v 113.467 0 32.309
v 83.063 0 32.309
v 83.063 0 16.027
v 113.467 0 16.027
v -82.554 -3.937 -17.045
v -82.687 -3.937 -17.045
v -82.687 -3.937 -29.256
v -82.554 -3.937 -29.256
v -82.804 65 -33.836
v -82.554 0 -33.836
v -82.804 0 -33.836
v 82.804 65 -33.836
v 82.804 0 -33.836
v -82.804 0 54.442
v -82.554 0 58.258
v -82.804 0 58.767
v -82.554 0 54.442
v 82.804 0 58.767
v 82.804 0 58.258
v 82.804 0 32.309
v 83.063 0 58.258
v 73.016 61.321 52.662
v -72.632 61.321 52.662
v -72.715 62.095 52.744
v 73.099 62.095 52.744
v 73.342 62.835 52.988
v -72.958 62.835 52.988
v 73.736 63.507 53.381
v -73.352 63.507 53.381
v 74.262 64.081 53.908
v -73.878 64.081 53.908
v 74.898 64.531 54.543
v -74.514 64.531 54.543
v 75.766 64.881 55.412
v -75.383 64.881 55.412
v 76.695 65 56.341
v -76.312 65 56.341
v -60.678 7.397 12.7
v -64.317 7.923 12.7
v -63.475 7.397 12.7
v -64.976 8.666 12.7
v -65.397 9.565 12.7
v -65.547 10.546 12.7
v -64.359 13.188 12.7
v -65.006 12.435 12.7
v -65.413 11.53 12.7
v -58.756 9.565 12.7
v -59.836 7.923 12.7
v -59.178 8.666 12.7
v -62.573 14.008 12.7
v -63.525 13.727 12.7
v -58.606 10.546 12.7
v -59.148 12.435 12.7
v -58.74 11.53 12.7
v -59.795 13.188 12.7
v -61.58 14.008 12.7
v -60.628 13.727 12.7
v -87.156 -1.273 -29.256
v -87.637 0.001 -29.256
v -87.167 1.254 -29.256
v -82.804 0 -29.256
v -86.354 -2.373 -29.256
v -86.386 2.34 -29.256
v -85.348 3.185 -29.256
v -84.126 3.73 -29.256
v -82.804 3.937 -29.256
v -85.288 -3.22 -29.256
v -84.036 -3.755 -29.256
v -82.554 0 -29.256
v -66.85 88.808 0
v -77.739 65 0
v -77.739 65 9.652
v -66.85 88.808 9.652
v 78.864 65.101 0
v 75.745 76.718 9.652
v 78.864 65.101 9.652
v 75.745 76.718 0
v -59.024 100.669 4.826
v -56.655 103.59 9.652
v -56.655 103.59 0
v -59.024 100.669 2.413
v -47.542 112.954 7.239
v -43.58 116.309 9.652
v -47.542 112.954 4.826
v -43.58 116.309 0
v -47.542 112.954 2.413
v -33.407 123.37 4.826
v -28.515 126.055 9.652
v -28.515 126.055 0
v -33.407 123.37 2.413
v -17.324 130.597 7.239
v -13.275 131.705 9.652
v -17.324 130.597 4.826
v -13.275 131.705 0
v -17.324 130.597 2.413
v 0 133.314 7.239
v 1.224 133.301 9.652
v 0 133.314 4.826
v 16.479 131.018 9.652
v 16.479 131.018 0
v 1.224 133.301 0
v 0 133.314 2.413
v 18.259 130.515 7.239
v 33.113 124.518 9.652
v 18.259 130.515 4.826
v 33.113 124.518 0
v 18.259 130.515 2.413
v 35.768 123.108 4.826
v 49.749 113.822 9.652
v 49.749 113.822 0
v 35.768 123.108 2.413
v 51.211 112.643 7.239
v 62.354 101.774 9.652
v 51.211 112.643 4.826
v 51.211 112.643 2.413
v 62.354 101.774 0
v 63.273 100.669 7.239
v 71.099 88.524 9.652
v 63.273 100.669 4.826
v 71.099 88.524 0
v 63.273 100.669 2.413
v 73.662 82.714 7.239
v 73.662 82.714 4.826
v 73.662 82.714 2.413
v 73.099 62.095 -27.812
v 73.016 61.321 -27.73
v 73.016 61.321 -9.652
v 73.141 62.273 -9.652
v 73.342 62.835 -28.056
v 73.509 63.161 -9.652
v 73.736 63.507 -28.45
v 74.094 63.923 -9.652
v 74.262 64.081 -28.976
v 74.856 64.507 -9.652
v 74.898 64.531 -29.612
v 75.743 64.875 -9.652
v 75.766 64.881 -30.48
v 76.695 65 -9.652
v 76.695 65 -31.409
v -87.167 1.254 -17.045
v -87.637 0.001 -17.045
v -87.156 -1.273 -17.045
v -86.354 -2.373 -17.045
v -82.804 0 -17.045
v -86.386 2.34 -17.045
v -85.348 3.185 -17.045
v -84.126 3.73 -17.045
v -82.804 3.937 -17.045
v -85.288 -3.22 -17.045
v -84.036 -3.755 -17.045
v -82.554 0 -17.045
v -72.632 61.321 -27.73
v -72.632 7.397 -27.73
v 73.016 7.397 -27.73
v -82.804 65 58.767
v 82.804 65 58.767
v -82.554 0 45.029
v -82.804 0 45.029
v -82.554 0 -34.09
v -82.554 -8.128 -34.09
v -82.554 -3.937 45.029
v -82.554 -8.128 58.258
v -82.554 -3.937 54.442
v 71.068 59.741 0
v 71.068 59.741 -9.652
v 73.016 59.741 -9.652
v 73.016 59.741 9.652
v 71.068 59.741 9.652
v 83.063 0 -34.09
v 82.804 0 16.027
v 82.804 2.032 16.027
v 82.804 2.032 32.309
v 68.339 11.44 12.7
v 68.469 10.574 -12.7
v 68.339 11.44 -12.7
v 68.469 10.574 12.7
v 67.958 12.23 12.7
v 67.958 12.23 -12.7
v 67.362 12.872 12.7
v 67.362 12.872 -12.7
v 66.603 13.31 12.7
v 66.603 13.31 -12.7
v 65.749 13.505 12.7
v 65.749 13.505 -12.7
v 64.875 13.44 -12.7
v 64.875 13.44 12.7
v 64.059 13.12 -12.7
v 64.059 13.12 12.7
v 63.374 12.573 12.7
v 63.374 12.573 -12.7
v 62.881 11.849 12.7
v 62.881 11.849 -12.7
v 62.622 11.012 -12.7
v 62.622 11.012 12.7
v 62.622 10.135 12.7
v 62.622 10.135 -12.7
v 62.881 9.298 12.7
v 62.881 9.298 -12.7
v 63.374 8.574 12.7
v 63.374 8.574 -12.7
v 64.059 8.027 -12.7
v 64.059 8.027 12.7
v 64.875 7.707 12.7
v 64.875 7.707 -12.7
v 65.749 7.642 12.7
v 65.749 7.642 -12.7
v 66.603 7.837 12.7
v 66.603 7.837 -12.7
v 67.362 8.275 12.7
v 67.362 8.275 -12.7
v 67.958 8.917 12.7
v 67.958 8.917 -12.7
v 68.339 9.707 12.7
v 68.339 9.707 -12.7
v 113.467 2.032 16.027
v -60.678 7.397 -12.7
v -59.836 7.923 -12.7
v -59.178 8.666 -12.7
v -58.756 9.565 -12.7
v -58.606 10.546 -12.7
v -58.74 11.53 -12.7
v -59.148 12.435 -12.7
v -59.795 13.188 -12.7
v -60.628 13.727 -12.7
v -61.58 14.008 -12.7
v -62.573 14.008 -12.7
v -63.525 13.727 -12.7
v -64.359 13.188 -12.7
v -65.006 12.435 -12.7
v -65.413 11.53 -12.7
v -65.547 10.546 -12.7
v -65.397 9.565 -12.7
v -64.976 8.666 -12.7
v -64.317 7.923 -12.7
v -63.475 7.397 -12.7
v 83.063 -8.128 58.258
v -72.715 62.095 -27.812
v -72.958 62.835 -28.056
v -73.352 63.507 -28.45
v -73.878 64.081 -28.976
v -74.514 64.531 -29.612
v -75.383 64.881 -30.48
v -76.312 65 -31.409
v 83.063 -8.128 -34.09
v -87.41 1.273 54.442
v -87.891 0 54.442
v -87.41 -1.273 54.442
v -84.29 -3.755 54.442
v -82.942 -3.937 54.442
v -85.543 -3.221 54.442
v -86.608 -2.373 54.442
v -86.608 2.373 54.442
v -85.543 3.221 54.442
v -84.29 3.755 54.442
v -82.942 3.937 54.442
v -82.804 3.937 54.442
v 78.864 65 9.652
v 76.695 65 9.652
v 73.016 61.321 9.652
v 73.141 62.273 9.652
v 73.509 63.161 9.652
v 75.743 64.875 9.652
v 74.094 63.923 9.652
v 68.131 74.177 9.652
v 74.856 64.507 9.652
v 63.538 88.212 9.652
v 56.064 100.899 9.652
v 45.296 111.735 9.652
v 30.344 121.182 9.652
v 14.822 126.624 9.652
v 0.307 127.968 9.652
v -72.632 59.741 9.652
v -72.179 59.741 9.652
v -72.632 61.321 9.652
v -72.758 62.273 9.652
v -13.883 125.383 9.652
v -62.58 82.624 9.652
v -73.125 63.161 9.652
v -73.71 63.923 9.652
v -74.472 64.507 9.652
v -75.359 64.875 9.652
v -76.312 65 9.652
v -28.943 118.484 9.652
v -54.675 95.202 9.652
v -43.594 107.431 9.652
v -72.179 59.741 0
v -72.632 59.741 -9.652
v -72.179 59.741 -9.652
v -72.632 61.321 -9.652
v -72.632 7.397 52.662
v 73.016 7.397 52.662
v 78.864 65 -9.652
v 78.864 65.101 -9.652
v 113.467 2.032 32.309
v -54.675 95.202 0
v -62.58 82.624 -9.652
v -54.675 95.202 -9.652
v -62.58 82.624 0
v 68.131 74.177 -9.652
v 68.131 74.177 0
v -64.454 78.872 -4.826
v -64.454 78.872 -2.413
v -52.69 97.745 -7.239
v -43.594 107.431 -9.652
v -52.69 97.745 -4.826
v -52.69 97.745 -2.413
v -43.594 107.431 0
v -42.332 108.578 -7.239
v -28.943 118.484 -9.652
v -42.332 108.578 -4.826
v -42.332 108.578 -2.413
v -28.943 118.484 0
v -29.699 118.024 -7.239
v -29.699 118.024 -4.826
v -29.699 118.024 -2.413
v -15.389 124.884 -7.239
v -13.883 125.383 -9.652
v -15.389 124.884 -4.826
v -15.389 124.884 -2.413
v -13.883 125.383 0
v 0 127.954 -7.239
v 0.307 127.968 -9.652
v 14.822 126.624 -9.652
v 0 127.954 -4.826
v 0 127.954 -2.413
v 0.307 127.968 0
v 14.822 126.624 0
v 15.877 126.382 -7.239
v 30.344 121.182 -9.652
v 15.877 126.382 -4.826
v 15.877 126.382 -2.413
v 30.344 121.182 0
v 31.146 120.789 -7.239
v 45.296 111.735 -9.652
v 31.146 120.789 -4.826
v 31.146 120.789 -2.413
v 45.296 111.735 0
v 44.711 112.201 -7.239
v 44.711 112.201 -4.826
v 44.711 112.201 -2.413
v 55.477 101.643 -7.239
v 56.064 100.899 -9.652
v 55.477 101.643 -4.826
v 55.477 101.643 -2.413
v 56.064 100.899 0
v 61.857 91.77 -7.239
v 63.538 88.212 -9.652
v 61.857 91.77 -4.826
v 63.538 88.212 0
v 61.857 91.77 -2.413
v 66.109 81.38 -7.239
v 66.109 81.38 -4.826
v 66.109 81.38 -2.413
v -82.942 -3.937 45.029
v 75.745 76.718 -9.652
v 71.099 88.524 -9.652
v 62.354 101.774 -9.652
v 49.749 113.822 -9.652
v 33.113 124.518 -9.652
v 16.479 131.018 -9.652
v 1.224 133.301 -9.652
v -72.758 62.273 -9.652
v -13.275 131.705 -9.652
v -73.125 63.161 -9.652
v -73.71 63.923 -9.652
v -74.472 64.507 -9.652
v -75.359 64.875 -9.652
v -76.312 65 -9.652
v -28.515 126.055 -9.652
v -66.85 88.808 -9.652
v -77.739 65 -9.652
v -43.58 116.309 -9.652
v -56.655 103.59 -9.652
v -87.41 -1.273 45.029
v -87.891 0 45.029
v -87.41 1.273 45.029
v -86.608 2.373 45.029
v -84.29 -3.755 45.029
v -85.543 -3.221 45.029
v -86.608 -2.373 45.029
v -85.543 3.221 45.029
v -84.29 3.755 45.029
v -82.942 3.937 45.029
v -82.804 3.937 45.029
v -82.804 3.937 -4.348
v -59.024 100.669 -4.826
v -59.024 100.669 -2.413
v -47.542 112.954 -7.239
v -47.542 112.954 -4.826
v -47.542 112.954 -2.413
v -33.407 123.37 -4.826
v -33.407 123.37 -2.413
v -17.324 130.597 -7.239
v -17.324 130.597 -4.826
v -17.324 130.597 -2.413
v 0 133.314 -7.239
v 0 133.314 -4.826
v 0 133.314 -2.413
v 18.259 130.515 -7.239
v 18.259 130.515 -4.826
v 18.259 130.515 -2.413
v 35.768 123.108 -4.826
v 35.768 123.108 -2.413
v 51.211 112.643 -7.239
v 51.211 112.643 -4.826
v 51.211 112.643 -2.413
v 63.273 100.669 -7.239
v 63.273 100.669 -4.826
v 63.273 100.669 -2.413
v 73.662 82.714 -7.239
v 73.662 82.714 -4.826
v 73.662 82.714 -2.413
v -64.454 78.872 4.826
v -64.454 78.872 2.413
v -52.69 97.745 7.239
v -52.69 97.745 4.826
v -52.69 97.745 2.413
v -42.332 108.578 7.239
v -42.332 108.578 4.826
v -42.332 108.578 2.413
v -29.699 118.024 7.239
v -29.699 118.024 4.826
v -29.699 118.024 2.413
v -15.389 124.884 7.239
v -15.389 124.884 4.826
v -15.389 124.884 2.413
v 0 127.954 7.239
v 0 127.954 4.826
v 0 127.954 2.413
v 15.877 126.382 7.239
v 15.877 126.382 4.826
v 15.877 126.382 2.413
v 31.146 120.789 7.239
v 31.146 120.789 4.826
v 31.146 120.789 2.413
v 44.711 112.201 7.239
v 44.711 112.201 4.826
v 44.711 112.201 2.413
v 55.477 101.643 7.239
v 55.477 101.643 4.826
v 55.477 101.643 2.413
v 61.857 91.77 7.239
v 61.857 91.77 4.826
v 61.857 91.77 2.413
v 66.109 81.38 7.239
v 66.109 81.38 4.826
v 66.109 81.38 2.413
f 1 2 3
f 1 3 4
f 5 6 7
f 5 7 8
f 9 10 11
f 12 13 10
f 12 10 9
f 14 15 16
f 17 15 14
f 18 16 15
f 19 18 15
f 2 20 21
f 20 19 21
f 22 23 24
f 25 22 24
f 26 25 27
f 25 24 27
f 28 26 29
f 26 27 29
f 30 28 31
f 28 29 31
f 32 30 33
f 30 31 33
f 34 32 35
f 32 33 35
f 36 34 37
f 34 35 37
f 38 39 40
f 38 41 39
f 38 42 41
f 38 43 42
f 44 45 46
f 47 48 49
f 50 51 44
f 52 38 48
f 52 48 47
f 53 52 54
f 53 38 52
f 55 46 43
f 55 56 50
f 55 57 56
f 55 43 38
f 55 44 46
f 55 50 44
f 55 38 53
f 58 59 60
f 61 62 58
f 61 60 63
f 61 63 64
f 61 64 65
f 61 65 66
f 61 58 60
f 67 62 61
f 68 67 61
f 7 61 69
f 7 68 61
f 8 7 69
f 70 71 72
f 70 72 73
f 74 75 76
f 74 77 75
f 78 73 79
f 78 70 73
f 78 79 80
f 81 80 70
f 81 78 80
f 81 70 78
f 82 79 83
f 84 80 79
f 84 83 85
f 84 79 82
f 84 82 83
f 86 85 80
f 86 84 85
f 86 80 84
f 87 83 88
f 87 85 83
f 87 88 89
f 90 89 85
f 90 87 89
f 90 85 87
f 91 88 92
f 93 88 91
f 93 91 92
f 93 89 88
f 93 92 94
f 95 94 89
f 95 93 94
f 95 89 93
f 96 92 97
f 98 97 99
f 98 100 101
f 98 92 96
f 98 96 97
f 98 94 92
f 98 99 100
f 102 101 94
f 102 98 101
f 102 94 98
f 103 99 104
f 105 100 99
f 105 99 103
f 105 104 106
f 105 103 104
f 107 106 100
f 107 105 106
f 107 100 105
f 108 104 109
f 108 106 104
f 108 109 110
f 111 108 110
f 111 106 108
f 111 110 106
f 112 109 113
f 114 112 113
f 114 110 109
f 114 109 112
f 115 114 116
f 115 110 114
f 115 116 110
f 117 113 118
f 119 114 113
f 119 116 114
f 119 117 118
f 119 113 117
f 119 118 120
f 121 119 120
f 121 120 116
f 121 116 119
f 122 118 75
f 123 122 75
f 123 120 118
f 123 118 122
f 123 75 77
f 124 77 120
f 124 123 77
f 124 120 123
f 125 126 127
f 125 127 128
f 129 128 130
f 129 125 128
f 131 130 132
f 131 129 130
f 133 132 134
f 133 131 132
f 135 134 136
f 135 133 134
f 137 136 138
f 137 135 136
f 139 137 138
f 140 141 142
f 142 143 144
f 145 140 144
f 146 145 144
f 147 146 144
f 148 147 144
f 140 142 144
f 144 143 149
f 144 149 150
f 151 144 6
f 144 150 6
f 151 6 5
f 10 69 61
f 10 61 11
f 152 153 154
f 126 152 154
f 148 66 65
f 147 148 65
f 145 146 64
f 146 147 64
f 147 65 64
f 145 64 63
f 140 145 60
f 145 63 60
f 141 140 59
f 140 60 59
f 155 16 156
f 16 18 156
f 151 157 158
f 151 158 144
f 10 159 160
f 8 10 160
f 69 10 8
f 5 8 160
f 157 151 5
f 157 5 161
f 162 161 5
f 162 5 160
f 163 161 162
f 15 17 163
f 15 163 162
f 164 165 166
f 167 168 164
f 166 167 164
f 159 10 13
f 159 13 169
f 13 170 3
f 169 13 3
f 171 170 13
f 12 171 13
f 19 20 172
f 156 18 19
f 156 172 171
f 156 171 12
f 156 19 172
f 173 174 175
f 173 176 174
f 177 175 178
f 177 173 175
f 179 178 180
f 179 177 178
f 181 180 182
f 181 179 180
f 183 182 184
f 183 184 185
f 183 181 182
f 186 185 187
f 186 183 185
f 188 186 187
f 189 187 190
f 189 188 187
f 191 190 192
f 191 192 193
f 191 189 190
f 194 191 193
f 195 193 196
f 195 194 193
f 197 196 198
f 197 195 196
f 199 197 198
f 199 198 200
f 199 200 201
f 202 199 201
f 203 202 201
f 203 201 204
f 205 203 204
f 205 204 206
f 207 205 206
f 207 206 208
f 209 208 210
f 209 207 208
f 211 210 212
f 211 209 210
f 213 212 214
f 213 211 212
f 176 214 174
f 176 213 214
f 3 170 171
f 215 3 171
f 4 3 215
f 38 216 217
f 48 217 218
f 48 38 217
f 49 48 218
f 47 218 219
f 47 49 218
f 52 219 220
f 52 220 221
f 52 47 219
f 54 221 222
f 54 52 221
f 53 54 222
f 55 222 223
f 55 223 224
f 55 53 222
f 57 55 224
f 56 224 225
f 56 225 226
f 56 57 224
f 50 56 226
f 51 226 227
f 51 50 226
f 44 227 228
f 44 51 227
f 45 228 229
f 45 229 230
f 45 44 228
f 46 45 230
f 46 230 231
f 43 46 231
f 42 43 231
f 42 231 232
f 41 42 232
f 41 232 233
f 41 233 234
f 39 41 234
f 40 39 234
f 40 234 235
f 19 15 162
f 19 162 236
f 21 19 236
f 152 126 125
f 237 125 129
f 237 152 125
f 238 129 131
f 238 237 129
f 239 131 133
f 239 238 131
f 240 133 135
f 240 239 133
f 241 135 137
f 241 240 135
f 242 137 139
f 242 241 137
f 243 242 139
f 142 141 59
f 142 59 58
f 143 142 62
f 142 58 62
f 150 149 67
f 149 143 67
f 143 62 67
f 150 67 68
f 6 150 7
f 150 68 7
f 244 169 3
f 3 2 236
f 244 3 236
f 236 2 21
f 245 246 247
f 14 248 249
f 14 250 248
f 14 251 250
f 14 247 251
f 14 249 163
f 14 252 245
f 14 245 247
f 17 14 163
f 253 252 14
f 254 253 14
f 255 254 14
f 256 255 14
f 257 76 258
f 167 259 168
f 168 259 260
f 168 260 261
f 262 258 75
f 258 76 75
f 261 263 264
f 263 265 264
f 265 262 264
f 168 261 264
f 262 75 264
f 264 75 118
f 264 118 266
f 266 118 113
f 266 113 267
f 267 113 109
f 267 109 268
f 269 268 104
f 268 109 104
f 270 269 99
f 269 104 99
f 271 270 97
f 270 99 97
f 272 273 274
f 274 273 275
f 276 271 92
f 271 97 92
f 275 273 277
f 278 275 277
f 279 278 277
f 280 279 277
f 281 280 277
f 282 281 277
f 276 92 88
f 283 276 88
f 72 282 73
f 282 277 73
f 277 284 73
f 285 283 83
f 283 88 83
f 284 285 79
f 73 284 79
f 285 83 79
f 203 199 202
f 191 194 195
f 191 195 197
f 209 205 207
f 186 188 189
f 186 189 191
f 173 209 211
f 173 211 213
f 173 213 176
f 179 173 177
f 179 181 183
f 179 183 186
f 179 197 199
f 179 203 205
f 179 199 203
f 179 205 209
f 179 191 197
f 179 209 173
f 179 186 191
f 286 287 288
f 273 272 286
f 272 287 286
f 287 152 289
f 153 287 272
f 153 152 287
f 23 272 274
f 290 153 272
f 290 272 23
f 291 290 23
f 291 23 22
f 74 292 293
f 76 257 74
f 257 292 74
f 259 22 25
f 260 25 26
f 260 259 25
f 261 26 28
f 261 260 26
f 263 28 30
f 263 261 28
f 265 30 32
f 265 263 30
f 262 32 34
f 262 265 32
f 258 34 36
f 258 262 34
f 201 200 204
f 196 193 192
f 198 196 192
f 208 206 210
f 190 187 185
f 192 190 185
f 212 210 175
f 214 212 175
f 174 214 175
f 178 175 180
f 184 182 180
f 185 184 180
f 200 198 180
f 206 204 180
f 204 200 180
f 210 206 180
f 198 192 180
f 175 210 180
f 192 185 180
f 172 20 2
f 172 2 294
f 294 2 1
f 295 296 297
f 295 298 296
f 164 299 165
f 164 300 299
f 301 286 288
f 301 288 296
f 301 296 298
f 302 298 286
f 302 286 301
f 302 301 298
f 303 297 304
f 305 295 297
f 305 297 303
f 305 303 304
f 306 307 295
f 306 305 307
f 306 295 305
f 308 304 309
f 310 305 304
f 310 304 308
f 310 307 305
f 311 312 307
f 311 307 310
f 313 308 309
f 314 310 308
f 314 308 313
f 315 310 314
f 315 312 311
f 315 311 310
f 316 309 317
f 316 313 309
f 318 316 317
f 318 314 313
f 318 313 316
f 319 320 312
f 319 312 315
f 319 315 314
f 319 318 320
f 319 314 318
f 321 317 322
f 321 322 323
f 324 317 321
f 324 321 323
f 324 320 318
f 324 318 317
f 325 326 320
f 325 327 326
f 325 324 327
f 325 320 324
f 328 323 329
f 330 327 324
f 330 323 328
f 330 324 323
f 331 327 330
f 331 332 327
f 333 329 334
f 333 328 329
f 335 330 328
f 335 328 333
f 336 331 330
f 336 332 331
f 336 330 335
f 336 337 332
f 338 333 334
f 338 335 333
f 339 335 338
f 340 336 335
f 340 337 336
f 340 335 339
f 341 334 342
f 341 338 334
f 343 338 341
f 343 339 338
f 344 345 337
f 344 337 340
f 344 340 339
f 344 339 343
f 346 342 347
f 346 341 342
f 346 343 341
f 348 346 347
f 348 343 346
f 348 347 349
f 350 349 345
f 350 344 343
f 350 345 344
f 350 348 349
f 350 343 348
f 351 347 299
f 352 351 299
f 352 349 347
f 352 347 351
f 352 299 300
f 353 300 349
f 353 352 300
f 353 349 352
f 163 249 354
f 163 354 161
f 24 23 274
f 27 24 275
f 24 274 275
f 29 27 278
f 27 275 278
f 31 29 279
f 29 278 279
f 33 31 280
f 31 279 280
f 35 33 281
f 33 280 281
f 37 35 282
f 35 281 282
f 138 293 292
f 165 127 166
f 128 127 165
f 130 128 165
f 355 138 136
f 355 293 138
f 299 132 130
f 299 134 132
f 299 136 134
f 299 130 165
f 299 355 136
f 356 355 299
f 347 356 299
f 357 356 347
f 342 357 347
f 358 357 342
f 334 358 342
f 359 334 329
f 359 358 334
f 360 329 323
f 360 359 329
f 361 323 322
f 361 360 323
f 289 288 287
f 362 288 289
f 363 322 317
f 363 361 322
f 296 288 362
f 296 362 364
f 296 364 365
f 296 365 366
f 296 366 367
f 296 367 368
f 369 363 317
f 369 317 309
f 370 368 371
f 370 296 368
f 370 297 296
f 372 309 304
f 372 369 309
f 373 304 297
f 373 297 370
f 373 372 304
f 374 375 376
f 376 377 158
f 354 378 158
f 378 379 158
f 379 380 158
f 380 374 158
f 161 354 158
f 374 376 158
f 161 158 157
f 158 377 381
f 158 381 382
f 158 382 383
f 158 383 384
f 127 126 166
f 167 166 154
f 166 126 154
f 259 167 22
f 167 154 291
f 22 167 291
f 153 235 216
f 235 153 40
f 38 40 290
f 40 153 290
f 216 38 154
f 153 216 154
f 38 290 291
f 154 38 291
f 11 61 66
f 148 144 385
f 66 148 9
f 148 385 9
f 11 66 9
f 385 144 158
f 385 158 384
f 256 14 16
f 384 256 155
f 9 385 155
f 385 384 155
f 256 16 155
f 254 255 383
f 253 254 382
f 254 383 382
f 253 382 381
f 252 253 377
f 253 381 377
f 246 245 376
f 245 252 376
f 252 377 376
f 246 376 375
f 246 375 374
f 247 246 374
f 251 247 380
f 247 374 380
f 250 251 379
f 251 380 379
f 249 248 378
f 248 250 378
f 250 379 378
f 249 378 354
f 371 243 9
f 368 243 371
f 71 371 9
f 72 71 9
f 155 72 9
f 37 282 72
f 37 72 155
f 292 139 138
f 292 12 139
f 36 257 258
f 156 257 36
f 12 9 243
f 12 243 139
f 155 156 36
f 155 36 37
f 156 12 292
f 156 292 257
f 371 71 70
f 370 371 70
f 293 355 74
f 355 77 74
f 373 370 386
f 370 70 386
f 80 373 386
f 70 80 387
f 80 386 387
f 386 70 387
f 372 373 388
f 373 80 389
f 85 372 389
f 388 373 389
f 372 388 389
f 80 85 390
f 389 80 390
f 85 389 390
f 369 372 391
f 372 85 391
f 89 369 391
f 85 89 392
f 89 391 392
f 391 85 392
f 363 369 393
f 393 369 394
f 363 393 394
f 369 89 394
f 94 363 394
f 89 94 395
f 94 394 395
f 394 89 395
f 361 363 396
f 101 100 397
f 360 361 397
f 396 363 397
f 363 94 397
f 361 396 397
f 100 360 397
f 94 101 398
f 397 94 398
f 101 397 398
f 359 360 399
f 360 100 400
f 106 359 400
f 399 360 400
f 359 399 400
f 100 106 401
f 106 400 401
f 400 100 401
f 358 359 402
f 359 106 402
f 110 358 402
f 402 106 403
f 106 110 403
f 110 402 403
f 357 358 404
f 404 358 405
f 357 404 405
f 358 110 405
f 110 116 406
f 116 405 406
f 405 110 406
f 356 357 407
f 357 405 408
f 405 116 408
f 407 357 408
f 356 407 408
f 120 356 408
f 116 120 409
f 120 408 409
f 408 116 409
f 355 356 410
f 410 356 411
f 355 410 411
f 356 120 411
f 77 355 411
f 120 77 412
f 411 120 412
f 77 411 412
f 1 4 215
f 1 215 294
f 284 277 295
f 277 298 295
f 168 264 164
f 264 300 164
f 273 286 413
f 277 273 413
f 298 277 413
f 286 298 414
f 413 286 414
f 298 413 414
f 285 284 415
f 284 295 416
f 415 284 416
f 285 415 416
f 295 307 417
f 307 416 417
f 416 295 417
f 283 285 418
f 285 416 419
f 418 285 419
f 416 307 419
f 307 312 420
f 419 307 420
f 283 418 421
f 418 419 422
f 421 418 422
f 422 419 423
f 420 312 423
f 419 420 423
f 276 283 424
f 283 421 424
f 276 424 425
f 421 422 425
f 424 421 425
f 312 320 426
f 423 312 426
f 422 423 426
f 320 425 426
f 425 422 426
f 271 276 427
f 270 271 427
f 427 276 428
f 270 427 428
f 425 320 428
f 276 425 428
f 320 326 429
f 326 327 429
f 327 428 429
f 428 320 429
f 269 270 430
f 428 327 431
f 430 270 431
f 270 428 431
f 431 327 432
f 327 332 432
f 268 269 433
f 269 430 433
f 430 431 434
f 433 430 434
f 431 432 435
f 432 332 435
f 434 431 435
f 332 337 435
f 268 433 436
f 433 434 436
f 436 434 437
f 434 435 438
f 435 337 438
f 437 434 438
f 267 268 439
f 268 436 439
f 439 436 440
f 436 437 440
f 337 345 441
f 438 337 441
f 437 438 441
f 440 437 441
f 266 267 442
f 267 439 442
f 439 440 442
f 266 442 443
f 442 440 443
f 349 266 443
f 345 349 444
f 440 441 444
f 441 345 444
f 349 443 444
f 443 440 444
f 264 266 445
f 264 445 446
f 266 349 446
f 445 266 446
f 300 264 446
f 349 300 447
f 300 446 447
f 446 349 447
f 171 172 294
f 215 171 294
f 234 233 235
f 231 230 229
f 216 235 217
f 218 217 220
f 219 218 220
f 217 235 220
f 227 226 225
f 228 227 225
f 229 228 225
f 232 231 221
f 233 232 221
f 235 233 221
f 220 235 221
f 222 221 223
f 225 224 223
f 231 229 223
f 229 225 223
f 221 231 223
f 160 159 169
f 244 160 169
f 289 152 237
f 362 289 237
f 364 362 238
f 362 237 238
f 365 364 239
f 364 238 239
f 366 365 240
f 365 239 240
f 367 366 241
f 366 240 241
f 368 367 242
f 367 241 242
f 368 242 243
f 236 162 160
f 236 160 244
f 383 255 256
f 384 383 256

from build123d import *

# Parameters (mm, degrees)
F0_W         = 165.6168848276
F0_H         = 92.3485867679
F1_DEPTH     = 8.128
F2_W         = 65.0001764297
F2_H         = 58.7672814727
F2_H_2       = 33.835709095
F3_DEPTH     = 82.804
F4_W         = 145.6484049559
F4_H         = 80.3916100413
F5_DEPTH     = 126.492
F7_DEPTH     = 9.652
F10_DEPTH    = 7.3972418904
F11_R        = 3.6792614691
F12_W        = 10.9393596649
F12_H        = 9.4129405916
F12_W_2      = 8.9041367173
F12_H_2      = 12.2113823891
F13_DEPTH    = 3.937
F14_T1_DEPTH = 34.8129405916
F14_T3_DEPTH = 37.6046565067
F14_T5_DEPTH = 37.6113823891
F17_R        = 3.4704088756
F18_DEPTH    = 12.7
F17_R_2      = 2.9399233627
F19_W        = 34.344509244
F19_H        = 16.2818413228
F20_DEPTH    = 2.032


# Not quite as in the source:
# - a fillet or chamfer that OpenCascade refuses, or shapes differently, is made with other operations: its cross-section is extruded or revolved along the edge and cut away or added
# - the program builds the solid bodies; features that only make, move or delete a surface that nothing else refers to are left out


with BuildPart() as f1:
    # F0 (on Front) → F1 (new body)
    with BuildSketch(Plane.XZ):
        with Locations((0.2544000745, 12.0841804892)):
            Rectangle(F0_W, F0_H)
    extrude(amount=F1_DEPTH)

    # F2 (on Right) → F3 (join, symmetric)
    with BuildSketch(Plane.YZ):
        with Locations((32.5000882149, 29.3836407363)):
            Rectangle(F2_W, F2_H)
        with Locations((32.5000882149, -16.9178545475)):
            Rectangle(F2_W, F2_H_2)
    extrude(amount=F3_DEPTH, both=True)

    # F4 (on Front) → F5 (cut)
    with BuildSketch(Plane.XZ):
        with Locations((0.191912055, 12.4657889828)):
            Rectangle(F4_W, F4_H)
    extrude(amount=-F5_DEPTH, mode=Mode.SUBTRACT)

    # F6 (on Top) → F7 (join, symmetric)
    with BuildSketch(Plane.XY):
        with BuildLine():
            add(Edge.make_bspline(
                [(-79.9747332931, 59.7409568727), (-74.759309212, 71.5402326481), (-64.1121283898, 104.8437669446), (-0.8218087411, 149.2928303601), (69.0623713402, 104.8495046273), (76.000106137, 76.6716472512), (78.8641497493, 65.1005506516)],
                knots=[0, 0, 0, 0, 0.2285913714, 0.5054588291, 0.7899145134, 1, 1, 1, 1], degree=3))
            Line((-79.9747332931, 59.7409568727), (-72.1789598465, 59.7409568727))
            add(Edge.make_bspline(
                [(-72.1789598465, 59.7409568727), (-67.4777405263, 72.5239789548), (-57.1703831688, 100.5505754042), (-1.1788929882, 141.3410376084), (62.5812635029, 105.9839202997), (68.3926515764, 74.3199638324), (71.0683837533, 59.7409568727)],
                knots=[0, 0, 0, 0, 0.226520536, 0.4966430951, 0.7682398336, 1, 1, 1, 1], degree=3))
            Line((71.0683837533, 59.7409568727), (78.8641497493, 59.7409568727))
            Line((78.8641497493, 59.7409568727), (78.8641497493, 65.1005506516))
        make_face()
    extrude(amount=F7_DEPTH, both=True)

    # F10 (add): a face of the model
    f10_faces = [f1.faces().sort_by_distance(p)[0] for p in [
        (0.191912055, 0, 12.4657889828),
    ]]
    extrude(f10_faces, amount=F10_DEPTH)

    # F11
    f11_edges = [f1.edges().sort_by_distance(p)[0] for p in [
        (0.191912, 65.000176, -27.730016),
        (0.191912, 65.000176, 52.661594),
        (-72.63229, 65.000176, 31.156797),
        (73.016115, 65.000176, 31.156797),
        (73.016115, 65.000176, -18.691008),
        (-72.63229, 65.000176, -18.691008),
    ]]
    fillet(f11_edges, radius=F11_R)

    # F12 (on Front) → F13 (join, symmetric)
    with BuildSketch(Plane.XZ):
        with Locations((-82.5518220663, 49.7359465808)):
            Rectangle(F12_W, F12_H)
        with Locations((-83.3150334656, -23.1507476419)):
            Rectangle(F12_W_2, F12_H_2)
    extrude(amount=F13_DEPTH, both=True)

    # F14: fillet of radius 5.08 on 4 edges, made by hand

    # F14_s2 → F14_t1 (cut)
    with BuildSketch(Plane.XY.offset(32.329476285)):
        with BuildLine():
            ThreePointArc((-82.9415018988, 3.937), (-86.5336043472, 2.4491024484), (-88.0215018988, -1.143))
            Line((-88.0215018988, -1.143), (-88.0215018988, 3.937))
            Line((-88.0215018988, 3.937), (-82.9415018988, 3.937))
        make_face()
        with BuildLine():
            ThreePointArc((-88.0215018988, 1.143), (-86.5336043472, -2.4491024484), (-82.9415018988, -3.937))
            Line((-82.9415018988, -3.937), (-88.0215018988, -3.937))
            Line((-88.0215018988, -3.937), (-88.0215018988, 1.143))
        make_face()
    extrude(amount=F14_T1_DEPTH, mode=Mode.SUBTRACT)

    # F14_s4 → F14_t3 (cut)
    with BuildSketch(Plane.XY.offset(-41.9530758953)):
        with BuildLine():
            ThreePointArc((-82.804, 3.937), (-86.3202989517, 2.4088773385), (-87.7671018243, -1.1416548235))
            Line((-87.7671018243, -1.1416548235), (-87.7671018243, 3.937))
            Line((-87.7671018243, 3.937), (-82.804, 3.937))
        make_face()
    extrude(amount=F14_T3_DEPTH, mode=Mode.SUBTRACT)

    # F14_s6 → F14_t5 (cut)
    with BuildSketch(Plane.XY.offset(-41.9564388365)):
        with BuildLine():
            ThreePointArc((-87.7671018243, 1.143), (-86.2792042727, -2.4491024484), (-82.6871018243, -3.937))
            Line((-82.6871018243, -3.937), (-87.7671018243, -3.937))
            Line((-87.7671018243, -3.937), (-87.7671018243, 1.143))
        make_face()
    extrude(amount=F14_T5_DEPTH, mode=Mode.SUBTRACT)

    # F17 (on Top) → F18 (join, symmetric)
    with BuildSketch(Plane.XY):
        with Locations((-62.0765909553, 10.5735119432)):
            Circle(F17_R)
    extrude(amount=F18_DEPTH, both=True)

    # F19 (on Front) → F20 (join)
    with BuildSketch(Plane.XZ):
        with Locations((96.2944850326, 24.1683619097)):
            Rectangle(F19_W, F19_H)
    extrude(amount=-F20_DEPTH)


with BuildPart() as f18:
    # F17 (on Top) → F18, piece 2 (new body, symmetric)
    with BuildSketch(Plane.XY):
        with Locations((65.5294060707, 10.5735119432)):
            Circle(F17_R_2)
    extrude(amount=F18_DEPTH, both=True)


solid = Compound([f1.part, f18.part])
